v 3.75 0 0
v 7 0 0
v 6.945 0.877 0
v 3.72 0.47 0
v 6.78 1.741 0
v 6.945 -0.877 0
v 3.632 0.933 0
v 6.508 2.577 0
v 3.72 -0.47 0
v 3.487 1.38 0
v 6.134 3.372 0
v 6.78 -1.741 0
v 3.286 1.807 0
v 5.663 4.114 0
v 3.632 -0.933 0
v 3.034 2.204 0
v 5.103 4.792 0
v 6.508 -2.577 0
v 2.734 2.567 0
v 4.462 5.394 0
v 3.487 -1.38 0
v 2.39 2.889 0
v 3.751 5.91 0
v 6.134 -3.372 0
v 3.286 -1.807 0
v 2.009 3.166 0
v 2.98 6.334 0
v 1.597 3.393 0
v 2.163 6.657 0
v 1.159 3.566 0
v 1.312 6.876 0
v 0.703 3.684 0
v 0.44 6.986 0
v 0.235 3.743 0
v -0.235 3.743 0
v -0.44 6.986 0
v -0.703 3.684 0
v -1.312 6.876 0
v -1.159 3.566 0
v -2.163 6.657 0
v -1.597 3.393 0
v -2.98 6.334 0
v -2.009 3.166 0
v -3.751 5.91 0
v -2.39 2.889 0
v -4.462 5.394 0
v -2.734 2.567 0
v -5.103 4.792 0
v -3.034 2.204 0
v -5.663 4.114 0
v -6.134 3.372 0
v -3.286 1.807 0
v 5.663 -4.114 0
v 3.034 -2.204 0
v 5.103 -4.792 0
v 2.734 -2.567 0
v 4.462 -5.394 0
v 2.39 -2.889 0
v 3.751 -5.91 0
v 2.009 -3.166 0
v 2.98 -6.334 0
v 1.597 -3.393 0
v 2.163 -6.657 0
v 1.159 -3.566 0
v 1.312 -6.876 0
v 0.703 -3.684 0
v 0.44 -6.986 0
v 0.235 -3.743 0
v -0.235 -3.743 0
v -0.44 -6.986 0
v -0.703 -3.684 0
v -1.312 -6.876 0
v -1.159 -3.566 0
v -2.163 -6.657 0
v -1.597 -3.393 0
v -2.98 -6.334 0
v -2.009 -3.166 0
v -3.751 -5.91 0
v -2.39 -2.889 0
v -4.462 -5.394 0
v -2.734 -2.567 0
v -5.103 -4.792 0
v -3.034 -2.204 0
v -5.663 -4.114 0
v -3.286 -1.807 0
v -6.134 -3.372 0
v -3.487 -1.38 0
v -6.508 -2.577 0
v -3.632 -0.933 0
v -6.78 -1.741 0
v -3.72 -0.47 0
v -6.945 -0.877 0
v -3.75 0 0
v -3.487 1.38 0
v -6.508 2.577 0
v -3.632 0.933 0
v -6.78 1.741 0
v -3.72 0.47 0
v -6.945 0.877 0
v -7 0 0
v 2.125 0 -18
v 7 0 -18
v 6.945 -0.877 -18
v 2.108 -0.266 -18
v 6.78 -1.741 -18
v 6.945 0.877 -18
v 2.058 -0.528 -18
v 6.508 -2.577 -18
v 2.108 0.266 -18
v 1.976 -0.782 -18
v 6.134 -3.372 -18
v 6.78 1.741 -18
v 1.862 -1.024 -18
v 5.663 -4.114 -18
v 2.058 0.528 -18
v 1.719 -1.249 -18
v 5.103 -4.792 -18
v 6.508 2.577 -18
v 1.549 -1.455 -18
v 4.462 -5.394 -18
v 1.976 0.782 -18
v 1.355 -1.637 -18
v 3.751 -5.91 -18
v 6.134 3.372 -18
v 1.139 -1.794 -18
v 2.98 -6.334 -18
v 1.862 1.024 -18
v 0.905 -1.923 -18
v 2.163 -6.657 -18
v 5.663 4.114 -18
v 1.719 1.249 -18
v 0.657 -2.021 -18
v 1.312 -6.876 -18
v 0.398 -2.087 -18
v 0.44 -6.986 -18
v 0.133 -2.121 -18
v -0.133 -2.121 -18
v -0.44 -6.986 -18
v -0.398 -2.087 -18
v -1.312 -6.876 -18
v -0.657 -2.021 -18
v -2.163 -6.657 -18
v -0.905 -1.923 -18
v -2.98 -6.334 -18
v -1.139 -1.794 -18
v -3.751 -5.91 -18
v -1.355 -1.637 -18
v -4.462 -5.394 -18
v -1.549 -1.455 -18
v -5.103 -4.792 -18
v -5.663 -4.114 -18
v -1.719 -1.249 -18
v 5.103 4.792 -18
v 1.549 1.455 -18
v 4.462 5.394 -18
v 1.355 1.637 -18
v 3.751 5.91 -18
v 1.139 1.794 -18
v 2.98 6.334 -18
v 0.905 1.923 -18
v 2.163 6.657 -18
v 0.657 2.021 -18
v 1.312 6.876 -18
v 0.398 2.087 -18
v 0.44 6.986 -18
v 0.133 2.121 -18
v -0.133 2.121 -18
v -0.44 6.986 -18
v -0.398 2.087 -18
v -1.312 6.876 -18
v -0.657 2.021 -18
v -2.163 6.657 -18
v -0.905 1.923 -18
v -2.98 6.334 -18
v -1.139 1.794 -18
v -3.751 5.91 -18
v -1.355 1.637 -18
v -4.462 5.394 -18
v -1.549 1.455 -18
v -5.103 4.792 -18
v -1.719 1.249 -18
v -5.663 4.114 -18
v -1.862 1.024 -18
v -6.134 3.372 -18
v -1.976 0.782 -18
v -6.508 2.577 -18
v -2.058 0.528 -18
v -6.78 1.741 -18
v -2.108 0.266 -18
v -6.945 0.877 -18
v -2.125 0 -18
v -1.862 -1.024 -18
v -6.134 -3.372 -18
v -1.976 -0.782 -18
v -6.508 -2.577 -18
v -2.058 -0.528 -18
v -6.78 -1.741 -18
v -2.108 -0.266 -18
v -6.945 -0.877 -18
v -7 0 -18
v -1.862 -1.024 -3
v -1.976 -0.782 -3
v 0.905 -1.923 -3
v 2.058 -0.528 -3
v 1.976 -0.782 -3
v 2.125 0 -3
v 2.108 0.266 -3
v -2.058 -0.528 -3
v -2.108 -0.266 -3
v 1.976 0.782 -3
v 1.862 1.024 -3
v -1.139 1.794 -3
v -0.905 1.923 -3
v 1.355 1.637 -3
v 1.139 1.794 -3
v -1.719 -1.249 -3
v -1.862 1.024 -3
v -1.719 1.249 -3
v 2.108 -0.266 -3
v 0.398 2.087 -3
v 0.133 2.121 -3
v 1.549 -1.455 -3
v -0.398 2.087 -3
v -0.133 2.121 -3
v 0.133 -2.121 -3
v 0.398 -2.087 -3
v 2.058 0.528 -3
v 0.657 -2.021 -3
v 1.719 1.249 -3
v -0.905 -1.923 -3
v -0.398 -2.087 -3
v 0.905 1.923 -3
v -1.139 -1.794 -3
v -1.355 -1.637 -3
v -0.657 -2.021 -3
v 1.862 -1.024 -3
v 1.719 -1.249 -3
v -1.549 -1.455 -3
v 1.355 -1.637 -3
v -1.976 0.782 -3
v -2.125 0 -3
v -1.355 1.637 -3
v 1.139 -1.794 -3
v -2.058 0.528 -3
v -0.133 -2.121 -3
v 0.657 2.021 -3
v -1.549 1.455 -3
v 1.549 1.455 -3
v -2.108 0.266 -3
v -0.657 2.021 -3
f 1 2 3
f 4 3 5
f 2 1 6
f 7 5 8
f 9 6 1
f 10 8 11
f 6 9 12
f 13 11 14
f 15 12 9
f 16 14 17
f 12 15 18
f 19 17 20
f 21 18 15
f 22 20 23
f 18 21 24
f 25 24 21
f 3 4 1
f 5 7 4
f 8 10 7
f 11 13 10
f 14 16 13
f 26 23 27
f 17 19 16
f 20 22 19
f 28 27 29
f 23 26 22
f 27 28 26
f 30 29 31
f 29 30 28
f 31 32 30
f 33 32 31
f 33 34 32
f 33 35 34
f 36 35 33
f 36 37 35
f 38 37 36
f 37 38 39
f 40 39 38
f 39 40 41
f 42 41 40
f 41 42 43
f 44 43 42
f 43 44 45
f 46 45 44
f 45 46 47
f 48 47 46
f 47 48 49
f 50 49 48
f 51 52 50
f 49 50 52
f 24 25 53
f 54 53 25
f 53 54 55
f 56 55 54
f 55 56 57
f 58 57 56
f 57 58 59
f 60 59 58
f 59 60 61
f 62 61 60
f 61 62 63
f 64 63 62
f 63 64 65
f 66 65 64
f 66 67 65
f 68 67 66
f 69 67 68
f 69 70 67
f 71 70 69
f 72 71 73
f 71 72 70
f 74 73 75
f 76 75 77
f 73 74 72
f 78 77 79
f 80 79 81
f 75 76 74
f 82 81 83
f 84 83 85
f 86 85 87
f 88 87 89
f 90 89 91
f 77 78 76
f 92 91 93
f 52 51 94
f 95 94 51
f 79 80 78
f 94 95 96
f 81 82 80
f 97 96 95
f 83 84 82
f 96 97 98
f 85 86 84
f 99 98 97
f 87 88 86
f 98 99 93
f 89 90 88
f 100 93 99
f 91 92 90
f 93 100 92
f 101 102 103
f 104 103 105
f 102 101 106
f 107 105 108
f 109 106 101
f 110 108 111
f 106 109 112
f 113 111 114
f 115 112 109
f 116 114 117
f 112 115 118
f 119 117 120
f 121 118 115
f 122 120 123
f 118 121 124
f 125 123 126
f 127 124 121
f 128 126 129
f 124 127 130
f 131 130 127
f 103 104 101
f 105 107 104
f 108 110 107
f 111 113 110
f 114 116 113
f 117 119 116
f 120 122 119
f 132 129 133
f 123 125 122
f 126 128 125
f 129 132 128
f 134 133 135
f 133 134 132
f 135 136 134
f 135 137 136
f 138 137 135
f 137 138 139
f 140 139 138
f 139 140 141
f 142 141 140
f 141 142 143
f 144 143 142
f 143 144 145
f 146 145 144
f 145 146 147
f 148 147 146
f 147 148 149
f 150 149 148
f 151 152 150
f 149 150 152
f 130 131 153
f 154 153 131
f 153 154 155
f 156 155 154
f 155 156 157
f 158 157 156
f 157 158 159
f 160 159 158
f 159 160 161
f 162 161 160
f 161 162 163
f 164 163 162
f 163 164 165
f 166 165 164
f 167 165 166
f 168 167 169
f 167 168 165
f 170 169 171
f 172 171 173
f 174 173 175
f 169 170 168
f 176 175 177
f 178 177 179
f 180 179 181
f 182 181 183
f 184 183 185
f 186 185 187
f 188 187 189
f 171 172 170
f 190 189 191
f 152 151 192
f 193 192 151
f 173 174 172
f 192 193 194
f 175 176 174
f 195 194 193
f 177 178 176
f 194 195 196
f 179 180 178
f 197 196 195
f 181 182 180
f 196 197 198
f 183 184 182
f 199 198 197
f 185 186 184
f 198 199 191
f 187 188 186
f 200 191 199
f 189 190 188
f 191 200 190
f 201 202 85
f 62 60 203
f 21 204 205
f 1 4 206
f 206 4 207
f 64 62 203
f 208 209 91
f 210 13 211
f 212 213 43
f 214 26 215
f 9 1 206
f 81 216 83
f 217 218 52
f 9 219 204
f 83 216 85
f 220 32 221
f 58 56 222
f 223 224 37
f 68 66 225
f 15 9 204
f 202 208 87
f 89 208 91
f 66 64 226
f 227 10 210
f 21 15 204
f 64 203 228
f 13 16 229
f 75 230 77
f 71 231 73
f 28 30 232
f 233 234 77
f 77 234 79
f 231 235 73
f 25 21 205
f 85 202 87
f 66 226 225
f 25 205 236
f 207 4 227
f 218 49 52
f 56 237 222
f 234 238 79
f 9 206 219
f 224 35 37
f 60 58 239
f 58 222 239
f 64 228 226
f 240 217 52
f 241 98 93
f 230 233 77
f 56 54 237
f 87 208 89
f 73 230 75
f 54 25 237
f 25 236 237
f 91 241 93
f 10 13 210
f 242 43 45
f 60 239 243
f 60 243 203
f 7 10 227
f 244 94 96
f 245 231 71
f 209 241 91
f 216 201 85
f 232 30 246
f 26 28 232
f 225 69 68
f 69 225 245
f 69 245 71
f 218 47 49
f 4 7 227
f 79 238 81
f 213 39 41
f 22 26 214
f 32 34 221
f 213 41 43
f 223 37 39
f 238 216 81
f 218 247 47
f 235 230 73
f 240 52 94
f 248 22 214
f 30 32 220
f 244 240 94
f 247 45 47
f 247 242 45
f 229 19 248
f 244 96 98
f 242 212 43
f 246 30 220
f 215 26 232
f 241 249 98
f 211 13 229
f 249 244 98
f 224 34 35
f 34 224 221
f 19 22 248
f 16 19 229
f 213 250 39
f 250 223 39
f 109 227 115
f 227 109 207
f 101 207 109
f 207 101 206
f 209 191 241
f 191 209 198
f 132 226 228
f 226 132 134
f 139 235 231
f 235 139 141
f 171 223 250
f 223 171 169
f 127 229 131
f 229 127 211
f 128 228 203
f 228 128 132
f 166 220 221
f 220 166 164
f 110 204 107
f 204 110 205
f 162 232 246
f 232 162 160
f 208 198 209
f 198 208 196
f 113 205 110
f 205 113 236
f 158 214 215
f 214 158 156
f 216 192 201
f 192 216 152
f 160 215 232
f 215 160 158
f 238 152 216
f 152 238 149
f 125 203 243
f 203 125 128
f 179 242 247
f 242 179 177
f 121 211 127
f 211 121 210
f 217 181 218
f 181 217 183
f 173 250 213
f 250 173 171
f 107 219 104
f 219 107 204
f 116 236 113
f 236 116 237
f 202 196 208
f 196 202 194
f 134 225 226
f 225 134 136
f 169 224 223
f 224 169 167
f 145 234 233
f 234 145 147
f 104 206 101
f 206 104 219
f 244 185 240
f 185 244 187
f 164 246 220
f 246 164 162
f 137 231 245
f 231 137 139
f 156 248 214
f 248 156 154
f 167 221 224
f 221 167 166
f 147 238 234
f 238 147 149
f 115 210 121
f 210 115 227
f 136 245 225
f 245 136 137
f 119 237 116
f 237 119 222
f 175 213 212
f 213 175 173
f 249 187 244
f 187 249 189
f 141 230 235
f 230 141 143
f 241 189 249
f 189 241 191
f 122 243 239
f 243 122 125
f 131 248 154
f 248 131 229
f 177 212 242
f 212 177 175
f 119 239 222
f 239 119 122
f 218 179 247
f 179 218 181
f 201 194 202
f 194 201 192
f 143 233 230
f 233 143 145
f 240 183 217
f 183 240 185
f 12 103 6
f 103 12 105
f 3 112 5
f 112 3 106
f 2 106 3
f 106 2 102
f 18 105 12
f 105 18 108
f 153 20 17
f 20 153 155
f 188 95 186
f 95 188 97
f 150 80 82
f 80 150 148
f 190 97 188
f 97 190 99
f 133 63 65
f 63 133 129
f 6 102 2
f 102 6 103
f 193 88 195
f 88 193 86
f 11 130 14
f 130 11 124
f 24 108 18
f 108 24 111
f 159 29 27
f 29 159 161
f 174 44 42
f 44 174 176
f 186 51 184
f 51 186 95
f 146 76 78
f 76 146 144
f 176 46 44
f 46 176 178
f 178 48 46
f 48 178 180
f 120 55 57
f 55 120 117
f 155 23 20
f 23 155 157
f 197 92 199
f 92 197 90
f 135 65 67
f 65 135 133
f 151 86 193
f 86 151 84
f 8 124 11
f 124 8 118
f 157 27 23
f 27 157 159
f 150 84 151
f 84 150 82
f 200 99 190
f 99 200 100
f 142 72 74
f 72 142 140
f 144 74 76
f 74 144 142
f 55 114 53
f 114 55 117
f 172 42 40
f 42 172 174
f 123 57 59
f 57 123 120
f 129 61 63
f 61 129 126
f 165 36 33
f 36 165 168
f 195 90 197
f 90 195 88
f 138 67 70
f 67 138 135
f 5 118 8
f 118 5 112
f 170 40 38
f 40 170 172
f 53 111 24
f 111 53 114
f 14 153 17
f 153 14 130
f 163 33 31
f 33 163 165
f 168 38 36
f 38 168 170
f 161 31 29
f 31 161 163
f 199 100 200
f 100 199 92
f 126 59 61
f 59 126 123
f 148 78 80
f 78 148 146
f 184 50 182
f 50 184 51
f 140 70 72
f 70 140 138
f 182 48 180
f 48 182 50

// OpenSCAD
$fn = 50;


difference() {
	union() {
		translate(v = [0, 0, -18.0000000000]) {
			cylinder(h = 18, r = 7.0000000000);
		}
	}
	union() {
		translate(v = [0, 0, 0]) {
			rotate(a = [0, 0, 0]) {
				difference() {
					union() {
						#translate(v = [0, 0, -18.0000000000]) {
							cylinder(h = 18, r = 2.0000000000);
						}
						#translate(v = [0, 0, -3]) {
							cylinder(h = 3, r1 = 2.1250000000, r2 = 3.7500000000);
						}
						#translate(v = [0, 0, -18.0000000000]) {
							cylinder(h = 18, r = 2.1250000000);
						}
						#translate(v = [0, 0, -18.0000000000]) {
							cylinder(h = 18, r = 2.0000000000);
						}
					}
					union();
				}
			}
		}
	}
}
